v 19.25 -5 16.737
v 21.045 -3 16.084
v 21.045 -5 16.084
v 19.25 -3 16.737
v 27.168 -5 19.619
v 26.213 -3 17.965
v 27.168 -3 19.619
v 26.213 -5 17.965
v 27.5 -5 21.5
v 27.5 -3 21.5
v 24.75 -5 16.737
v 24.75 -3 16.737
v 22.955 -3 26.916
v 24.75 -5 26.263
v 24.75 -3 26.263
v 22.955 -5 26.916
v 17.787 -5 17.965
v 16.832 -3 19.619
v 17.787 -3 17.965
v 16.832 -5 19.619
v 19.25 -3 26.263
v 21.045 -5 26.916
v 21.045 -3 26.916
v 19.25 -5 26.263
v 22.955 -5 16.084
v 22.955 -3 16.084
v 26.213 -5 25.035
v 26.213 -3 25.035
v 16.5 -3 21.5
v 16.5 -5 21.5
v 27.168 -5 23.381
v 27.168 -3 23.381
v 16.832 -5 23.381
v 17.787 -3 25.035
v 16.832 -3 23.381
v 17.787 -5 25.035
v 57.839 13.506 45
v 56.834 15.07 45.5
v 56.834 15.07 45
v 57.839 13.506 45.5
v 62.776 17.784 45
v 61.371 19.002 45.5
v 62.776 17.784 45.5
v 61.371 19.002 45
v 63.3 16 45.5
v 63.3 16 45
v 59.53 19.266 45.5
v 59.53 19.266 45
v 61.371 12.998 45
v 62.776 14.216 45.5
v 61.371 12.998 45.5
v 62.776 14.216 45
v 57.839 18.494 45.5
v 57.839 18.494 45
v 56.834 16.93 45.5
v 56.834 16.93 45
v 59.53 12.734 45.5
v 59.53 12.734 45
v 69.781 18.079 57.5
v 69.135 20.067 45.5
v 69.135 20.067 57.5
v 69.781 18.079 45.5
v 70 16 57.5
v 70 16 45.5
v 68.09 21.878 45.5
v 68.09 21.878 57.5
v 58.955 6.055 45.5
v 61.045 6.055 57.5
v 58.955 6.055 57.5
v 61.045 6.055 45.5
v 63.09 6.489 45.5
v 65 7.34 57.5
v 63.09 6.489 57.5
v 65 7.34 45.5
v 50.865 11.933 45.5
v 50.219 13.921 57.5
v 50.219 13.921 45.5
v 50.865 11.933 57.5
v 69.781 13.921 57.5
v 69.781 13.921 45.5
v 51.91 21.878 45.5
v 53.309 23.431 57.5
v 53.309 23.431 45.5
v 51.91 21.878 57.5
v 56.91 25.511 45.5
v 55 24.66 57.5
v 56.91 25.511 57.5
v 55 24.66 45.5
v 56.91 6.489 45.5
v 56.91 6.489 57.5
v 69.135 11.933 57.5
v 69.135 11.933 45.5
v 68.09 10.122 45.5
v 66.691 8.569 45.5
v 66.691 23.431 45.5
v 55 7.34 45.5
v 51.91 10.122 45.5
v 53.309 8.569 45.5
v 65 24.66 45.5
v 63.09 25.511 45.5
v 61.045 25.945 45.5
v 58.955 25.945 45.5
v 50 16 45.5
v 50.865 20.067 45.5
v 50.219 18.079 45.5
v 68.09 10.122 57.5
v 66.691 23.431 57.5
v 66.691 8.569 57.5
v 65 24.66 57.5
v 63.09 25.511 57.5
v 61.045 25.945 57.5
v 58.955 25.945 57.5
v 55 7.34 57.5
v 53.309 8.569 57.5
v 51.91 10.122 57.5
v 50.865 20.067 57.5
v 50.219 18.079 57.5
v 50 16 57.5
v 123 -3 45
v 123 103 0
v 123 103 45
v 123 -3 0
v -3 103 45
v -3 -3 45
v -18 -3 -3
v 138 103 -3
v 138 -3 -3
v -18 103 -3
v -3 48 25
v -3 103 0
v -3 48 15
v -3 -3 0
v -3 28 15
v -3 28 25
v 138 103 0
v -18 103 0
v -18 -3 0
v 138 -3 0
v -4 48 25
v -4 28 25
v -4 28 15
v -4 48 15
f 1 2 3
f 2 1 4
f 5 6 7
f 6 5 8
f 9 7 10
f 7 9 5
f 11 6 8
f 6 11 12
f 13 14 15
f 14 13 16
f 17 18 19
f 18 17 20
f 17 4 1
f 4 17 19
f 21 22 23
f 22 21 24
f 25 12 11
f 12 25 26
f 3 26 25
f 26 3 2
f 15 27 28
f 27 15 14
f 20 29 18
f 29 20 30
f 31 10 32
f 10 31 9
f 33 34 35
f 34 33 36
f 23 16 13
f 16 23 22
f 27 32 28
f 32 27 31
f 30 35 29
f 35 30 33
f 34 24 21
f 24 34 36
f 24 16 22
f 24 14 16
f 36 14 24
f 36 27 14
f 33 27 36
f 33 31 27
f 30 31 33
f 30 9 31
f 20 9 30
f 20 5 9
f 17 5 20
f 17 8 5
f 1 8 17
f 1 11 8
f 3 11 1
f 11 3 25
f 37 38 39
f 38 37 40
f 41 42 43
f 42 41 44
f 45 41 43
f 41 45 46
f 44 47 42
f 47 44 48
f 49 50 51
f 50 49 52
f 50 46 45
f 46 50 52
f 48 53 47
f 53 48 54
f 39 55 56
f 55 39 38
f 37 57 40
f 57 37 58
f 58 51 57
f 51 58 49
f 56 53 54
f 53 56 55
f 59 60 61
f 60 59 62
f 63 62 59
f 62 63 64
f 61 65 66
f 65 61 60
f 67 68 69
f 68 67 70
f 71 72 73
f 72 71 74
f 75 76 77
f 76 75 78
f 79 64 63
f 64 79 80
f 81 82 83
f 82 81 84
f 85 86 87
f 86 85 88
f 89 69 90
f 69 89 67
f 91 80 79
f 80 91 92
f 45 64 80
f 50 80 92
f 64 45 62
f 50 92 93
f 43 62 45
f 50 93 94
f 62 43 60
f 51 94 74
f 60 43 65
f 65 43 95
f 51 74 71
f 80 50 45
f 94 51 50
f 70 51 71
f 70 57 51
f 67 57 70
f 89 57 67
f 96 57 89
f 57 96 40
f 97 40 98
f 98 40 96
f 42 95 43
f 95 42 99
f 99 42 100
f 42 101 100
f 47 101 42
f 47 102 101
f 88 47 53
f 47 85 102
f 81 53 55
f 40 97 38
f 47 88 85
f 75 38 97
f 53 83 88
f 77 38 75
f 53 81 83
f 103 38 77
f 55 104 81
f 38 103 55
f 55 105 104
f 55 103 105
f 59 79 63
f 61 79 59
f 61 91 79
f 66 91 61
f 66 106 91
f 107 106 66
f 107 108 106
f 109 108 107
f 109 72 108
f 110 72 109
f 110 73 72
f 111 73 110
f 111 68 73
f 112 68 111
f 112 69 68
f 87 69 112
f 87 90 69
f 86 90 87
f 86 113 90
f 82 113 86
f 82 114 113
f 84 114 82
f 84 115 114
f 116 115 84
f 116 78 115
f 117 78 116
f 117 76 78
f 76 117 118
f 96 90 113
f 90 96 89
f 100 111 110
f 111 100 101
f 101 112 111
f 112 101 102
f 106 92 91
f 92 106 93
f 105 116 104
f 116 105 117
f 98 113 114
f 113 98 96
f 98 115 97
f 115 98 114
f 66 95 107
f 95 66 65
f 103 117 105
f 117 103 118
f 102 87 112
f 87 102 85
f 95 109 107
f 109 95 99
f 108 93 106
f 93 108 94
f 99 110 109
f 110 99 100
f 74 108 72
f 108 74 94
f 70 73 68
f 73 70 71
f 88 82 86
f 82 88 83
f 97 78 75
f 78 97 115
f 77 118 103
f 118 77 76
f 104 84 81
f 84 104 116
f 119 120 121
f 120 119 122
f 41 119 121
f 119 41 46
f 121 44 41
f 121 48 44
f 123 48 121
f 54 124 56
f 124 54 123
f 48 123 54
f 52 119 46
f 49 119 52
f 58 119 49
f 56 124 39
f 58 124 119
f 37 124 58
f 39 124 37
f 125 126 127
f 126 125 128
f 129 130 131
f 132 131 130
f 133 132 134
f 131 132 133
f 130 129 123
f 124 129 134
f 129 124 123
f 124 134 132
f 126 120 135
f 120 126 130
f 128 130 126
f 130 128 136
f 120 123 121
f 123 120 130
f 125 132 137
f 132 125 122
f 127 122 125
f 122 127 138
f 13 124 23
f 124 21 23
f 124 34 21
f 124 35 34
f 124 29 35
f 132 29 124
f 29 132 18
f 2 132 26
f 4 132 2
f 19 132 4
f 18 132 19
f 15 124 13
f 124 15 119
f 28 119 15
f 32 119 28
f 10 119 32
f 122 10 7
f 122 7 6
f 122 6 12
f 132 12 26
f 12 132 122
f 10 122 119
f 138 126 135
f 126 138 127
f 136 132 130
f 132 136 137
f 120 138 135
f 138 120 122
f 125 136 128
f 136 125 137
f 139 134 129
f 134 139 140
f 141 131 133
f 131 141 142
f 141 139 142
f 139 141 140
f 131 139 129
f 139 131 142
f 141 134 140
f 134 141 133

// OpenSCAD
translate([0,0,5.5-3.0]) pcba();

color("brown",alpha=0.2) translate([-3,-3,-3]) cube([120+3+3,100+3+3,48]);
color("brown",alpha=0.2) translate([-3-15,-3,-3]) cube([120+3+3+15+15,100+3+3,3]);
color("gray",alpha=0.9) translate([-4,28,15]) cube([10,20,10]);
 
module pcba(){
    color("green") translate([0,0,28]) cube([120,100,1.5]);         //PCB
    color("blue") translate([60,16,28+1.5+5]) cube([10,11,10],center=true);//pot
    color("gray") translate([82,4,0]) cube([28,23,28]);             //transformer
    translate([22,-5,28-9]) rotate([-90,0,0]) cylinder(33,5.5,5.5); //jack
    translate([12,0,28-0-16]) cube([20,21,16]);                     //jack body
    //translate([30,61,28+1.5]) cube([66,34,18]);
    translate([30,61,28+1.5-10-1.5]) cube([66,34,10]);              //component vol
    color("red") translate([65,62,28-18]) cube([17,13,18]);         //fazel inductor
    color("black") translate([0+8,0+50-16,0]) cube([17,49,26]);
    color("gray",alpha=0.5) translate([0+7-1,0+50-2-16,0-2]) rotate([0,0,0]) cube([18+3,50+3,27+3]);             //9V battery 
    //color("black") translate([27+9,32+3,7]) cube([83-9-9,18,21]);           //dummy coil
    color("black") translate([27+9+7,32+3,7]) cube([70-9-9,18,21]);
    color("black") translate([27+9+7,32+9+3,7]) cylinder(21,9,9);           //dummy coil
    //color("black") translate([27+84-9,32+9+3,7]) cylinder(21,9,9);
    color("black") translate([27+70-9+7,32+9+3,7]) cylinder(21,9,9);    //dummy coil
    color("ivory",alpha=0.5) translate([27,32,7]) cube([84,24,20]);           //dummy coil
    color("gray") translate([104,72,28-8]) cube([5,25,8]);          //header
    
    for (i = [10 : 20 : 110]) {
        translate([i-4/2, 45, 28+1.5]) cube([4,9,6]);               //switches
        //color("gray",alpha=0.9) translate([i-12/2+4/2-4/2, 45-30/2+9/2, 28+1.5]) cube([12,30,14]);
        //color("orange",alpha=1) translate([i-12/2+4/2-4/2-3.5+4, 45-30/2+9/2-2, 28+1.5+5]) cube([11,28,7]);
        color("gray",alpha=0.4) translate([i-12/2+4/2-4/2-3.5+4+3, 45-30/2+9/2-2-2-1, 28+1.5+0]) cube([11-6,28+6,10]);
        color("gray",alpha=0.4) translate([i-12/2+4/2-4/2-3.5, 45-30/2+9/2-2, 28+1.5]) cube([12+6+1,28,10]);

    } 
    
    color("gray") translate([60,16,28+1.5]) cylinder(25,3.3,3.3);
    color("ivory") translate([60,16,48-5]) cylinder(12,10,10);
    
    translate([5,5,-2.5]) cylinder(48-6,2,2);
    translate([120-5,5,-2.5]) cylinder(48-6,2,2);
    translate([40,30,-2.5]) cylinder(48-6,2,2);
    translate([120-40,30,-2.5]) cylinder(48-6,2,2);
    translate([5,65,-2.5]) cylinder(48-6,2,2);
    translate([120-5,65,-2.5]) cylinder(48-6,2,2);
}
 
//switches @ y = 50mm
//10, 30, 50, 70, 90, 110
//travel ammount: 2 mm
//4 x 9 x 6
//17 x 49 x 26
